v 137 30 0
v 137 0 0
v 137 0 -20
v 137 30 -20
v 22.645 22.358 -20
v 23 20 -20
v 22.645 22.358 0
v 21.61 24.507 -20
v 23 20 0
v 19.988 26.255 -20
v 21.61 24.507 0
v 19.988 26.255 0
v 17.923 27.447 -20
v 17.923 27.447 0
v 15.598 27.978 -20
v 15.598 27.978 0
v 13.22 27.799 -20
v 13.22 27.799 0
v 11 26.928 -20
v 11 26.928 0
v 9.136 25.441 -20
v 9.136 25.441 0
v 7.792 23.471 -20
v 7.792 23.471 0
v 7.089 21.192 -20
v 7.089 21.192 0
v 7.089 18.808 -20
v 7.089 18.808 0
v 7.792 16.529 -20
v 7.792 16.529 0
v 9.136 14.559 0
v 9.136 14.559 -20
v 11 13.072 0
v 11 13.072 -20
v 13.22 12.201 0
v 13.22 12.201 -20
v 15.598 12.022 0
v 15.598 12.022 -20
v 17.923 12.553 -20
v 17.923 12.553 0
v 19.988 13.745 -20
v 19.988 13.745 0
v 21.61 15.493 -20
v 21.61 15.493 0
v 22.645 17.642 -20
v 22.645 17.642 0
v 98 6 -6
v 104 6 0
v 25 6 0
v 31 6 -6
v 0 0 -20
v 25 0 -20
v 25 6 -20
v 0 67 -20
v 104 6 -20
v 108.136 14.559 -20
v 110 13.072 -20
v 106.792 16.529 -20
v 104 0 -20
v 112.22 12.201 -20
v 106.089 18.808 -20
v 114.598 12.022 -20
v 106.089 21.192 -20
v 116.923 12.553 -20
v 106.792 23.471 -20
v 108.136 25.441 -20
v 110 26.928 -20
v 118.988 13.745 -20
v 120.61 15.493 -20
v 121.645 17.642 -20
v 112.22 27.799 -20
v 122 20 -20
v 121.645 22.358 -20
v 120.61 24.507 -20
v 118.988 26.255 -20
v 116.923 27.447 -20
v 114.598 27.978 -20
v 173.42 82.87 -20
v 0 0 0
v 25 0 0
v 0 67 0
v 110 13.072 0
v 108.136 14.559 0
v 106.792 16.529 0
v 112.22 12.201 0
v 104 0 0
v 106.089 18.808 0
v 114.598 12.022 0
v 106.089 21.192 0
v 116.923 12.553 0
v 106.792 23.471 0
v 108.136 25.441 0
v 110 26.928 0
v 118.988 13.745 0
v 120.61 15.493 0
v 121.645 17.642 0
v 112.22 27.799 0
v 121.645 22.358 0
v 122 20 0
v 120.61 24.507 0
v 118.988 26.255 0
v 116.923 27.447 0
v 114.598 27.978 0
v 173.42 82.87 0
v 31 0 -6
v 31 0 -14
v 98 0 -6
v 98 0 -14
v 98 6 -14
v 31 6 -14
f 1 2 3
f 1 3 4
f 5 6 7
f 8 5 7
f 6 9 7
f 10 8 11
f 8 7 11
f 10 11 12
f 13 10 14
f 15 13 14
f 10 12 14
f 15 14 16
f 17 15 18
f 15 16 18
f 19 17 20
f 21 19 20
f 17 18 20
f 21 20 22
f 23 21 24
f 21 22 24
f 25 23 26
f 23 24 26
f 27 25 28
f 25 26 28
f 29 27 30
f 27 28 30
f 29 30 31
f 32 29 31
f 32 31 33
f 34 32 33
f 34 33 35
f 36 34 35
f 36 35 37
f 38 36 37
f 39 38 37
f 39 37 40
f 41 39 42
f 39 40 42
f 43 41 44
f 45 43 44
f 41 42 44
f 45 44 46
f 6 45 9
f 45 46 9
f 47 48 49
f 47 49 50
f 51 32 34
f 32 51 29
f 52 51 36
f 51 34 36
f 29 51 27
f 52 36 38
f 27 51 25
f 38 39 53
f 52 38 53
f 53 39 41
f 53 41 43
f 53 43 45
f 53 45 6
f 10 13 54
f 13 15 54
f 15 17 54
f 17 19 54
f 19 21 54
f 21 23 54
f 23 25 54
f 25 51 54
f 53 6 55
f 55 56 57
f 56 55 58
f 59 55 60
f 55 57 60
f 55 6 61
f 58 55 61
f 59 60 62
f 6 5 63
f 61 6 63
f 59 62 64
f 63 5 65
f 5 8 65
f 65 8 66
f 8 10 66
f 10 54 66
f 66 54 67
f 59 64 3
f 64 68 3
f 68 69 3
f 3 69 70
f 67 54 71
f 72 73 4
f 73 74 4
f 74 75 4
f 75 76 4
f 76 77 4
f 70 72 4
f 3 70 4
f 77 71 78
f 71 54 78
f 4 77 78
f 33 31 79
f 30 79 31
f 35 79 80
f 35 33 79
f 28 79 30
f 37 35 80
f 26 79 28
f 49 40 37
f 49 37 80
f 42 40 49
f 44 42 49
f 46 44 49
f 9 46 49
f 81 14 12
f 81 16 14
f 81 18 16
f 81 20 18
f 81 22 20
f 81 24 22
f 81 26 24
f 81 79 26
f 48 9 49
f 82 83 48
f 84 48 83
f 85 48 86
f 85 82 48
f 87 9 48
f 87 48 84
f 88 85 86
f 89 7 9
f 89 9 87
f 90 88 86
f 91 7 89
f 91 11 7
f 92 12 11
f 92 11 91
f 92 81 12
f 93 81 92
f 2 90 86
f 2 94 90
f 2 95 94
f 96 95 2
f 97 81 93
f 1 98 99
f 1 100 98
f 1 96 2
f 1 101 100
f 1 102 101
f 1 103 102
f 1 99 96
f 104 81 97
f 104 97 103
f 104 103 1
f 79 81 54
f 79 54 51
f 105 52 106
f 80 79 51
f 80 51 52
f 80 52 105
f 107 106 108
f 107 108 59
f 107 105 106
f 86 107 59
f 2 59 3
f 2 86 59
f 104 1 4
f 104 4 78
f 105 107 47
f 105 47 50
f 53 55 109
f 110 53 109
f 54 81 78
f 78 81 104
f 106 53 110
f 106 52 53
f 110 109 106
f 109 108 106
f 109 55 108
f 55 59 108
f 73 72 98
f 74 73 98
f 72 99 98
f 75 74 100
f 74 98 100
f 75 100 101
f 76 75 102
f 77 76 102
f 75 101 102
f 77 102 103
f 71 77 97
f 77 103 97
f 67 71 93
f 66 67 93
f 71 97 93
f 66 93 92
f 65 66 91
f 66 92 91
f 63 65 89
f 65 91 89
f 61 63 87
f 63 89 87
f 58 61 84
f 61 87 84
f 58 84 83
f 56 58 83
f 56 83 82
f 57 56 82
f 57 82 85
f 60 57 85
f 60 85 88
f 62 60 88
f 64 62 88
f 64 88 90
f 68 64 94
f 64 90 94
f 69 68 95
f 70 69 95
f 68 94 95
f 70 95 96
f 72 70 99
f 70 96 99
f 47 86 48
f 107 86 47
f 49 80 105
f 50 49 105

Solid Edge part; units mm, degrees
sketch "Sketch1" plane through (0, 0, 0) normal (0, 0, 1) x (1, 0, 0)
  line L0 (0, 0) -> (173.42, 0)
  line L1 (173.42, 0) -> (173.42, 82.87)
  line L2 (173.42, 82.87) -> (0, 82.87)
  line L3 (0, 82.87) -> (0, 0)
extrude "Protrusion1" add sketch "Sketch1" against normal blind 20
sketch "Sketch2" plane through (86.71, 41.435, 0) normal (0, 0, 1) x (0, 1, 0)
  line L0 (-41.435, -50.29) -> (-11.435, -50.29)
  line L1 (-11.435, -50.29) -> (41.435, -86.71)
  line L2 (41.435, -86.71) -> (-41.435, -86.71)
  line L3 (-41.435, -86.71) -> (-41.435, -50.29)
extrude "ExtrudedCutout_1" cut sketch "Sketch2" against normal blind 20
sketch "Sketch3" plane through (86.71, 41.435, 0) normal (0, 0, 1) x (0, 1, 0)
  line L0 (25.565, 86.71) -> (41.435, -86.71)
  line L1 (41.435, -86.71) -> (41.435, 86.71)
  line L2 (41.435, 86.71) -> (25.565, 86.71)
extrude "ExtrudedCutout_2" cut sketch "Sketch3" against normal blind 20
sketch "Sketch4" plane through (86.71, 41.435, 0) normal (0, 0, 1) x (1, 0, 0)
  circle A0 centre (-71.71, -21.435) radius 8
  circle A1 centre (27.29, -21.435) radius 8
extrude "ExtrudedCutout_3" cut sketch "Sketch4" against normal blind 20
sketch "Sketch5" plane through (68.5, 0, -10) normal (0, -1, 0) x (1, 0, 0)
  line L0 (35.5, 10) -> (-43.5, 10)
  line L1 (-43.5, 10) -> (-37.5, 4)
  line L2 (29.5, 4) -> (-37.5, 4)
  line L3 (35.5, 10) -> (29.5, 4)
extrude "ExtrudedCutout_4" cut sketch "Sketch5" against normal blind 6
sketch "Sketch6" plane through (68.5, 0, -10) normal (0, -1, 0) x (1, 0, 0)
  line L0 (35.5, -10) -> (-43.5, -10)
  line L1 (35.5, -10) -> (29.5, -4)
  line L2 (29.5, -4) -> (-37.5, -4)
  line L3 (-43.5, -10) -> (-37.5, -4)
extrude "ExtrudedCutout_5" cut sketch "Sketch6" against normal blind 6
